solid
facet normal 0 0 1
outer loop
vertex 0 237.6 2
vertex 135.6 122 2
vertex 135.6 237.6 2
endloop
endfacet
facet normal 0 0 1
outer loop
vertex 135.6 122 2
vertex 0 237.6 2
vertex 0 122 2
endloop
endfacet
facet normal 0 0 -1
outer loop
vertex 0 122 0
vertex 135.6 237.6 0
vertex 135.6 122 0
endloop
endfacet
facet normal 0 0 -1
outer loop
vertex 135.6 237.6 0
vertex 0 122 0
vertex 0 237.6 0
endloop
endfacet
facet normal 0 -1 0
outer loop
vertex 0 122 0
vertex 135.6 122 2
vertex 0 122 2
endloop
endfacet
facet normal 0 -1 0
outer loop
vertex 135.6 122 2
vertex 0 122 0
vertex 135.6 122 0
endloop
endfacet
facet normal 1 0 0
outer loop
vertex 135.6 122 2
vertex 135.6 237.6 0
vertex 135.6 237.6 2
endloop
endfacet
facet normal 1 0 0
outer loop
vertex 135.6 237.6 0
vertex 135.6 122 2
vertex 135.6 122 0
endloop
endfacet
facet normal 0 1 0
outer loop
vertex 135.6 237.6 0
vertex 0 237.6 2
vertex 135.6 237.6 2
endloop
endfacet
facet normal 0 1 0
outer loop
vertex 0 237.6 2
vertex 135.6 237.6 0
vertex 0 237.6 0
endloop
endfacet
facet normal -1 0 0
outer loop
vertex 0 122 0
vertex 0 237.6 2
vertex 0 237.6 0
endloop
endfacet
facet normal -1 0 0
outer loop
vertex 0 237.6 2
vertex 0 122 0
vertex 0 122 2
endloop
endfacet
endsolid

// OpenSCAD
UnitLength = 120;
UnitWidth = 140;
UnitHeight = 40;
WallThickness = 2;

PowerHolePositionY = 10.3+WallThickness;
PowerHolePositionZ = UnitHeight-WallThickness*7-1+4;
PowerHoleSizeY = 6;
PowerHoleSizeZ = 2.5;

/*
OutputHolePositionY = 18.5+WallThickness;
OutputHolePositionZ = UnitHeight-WallThickness*7;
OutputHoleSizeY = 0;
OutputHoleSizeZ = 0;

InputHolePositionY = 45+WallThickness;
InputHolePositionZ = UnitHeight-WallThickness*7-1.8+5;
InputHoleSizeY = 0;
InputHoleSizeZ = 0;
*/

LCD1602SizeX=25;
LCD1602SizeY=72;
LCD1602PositionX=UnitWidth-LCD1602SizeX-10;
LCD1602PositionY=UnitLength-LCD1602SizeY-14;

SwitchSizeX=7;
SwitchSizeY=7;
SwitchPositionX=UnitWidth - 15;
SwitchPositionY=8+WallThickness;

OutletSizeX = 65;
OutletSizeY = 65;
OutletPositionX = 18;
OutletPositionY = UnitLength-OutletSizeY-18;;


// Bottom Cover

translate([0,UnitLength+WallThickness,0]) {
    cube([UnitWidth-2*WallThickness-0.4, UnitLength-2*WallThickness-0.4, WallThickness], center=false);
}

// Shell
/*
difference() {

        difference() {
            cube([UnitWidth, UnitLength, UnitHeight], center=false);
                translate([WallThickness, WallThickness, -WallThickness]) {
                    cube([UnitWidth - 2*WallThickness, UnitLength -2*WallThickness, UnitHeight
], center=false);
            }

            translate([SwitchPositionX,SwitchPositionY,UnitHeight-WallThickness]) {

                cube([SwitchSizeX, SwitchSizeY, WallThickness], center=false);
            }

            translate([LCD1602PositionX,LCD1602PositionY,UnitHeight-WallThickness]) {

                cube([LCD1602SizeX, LCD1602SizeY, WallThickness], center=false);
            }

            translate([OutletPositionX,OutletPositionY,UnitHeight-WallThickness]) {

                cube([OutletSizeX, OutletSizeY, WallThickness], center=false);
            }

            translate([0,PowerHolePositionY,PowerHolePositionZ]) {
                cube([WallThickness, PowerHoleSizeY, PowerHoleSizeZ], center=false);
            }
       }
}


translate([UnitWidth-0.2, 12, 22]) {
    rotate([90, 0, 90]) {
        linear_extrude(height = 1/2){
            text("220V Remote Switch", size=6, font="Arial Black");
        }
    }
}

translate([UnitWidth-0.2, 10, 12]) {
    rotate([90, 0, 90]) {
        linear_extrude(height = 1/2){
            text("220V 10A Output Max", size=6, font="Arial Black");
        }
    }
}
*/
